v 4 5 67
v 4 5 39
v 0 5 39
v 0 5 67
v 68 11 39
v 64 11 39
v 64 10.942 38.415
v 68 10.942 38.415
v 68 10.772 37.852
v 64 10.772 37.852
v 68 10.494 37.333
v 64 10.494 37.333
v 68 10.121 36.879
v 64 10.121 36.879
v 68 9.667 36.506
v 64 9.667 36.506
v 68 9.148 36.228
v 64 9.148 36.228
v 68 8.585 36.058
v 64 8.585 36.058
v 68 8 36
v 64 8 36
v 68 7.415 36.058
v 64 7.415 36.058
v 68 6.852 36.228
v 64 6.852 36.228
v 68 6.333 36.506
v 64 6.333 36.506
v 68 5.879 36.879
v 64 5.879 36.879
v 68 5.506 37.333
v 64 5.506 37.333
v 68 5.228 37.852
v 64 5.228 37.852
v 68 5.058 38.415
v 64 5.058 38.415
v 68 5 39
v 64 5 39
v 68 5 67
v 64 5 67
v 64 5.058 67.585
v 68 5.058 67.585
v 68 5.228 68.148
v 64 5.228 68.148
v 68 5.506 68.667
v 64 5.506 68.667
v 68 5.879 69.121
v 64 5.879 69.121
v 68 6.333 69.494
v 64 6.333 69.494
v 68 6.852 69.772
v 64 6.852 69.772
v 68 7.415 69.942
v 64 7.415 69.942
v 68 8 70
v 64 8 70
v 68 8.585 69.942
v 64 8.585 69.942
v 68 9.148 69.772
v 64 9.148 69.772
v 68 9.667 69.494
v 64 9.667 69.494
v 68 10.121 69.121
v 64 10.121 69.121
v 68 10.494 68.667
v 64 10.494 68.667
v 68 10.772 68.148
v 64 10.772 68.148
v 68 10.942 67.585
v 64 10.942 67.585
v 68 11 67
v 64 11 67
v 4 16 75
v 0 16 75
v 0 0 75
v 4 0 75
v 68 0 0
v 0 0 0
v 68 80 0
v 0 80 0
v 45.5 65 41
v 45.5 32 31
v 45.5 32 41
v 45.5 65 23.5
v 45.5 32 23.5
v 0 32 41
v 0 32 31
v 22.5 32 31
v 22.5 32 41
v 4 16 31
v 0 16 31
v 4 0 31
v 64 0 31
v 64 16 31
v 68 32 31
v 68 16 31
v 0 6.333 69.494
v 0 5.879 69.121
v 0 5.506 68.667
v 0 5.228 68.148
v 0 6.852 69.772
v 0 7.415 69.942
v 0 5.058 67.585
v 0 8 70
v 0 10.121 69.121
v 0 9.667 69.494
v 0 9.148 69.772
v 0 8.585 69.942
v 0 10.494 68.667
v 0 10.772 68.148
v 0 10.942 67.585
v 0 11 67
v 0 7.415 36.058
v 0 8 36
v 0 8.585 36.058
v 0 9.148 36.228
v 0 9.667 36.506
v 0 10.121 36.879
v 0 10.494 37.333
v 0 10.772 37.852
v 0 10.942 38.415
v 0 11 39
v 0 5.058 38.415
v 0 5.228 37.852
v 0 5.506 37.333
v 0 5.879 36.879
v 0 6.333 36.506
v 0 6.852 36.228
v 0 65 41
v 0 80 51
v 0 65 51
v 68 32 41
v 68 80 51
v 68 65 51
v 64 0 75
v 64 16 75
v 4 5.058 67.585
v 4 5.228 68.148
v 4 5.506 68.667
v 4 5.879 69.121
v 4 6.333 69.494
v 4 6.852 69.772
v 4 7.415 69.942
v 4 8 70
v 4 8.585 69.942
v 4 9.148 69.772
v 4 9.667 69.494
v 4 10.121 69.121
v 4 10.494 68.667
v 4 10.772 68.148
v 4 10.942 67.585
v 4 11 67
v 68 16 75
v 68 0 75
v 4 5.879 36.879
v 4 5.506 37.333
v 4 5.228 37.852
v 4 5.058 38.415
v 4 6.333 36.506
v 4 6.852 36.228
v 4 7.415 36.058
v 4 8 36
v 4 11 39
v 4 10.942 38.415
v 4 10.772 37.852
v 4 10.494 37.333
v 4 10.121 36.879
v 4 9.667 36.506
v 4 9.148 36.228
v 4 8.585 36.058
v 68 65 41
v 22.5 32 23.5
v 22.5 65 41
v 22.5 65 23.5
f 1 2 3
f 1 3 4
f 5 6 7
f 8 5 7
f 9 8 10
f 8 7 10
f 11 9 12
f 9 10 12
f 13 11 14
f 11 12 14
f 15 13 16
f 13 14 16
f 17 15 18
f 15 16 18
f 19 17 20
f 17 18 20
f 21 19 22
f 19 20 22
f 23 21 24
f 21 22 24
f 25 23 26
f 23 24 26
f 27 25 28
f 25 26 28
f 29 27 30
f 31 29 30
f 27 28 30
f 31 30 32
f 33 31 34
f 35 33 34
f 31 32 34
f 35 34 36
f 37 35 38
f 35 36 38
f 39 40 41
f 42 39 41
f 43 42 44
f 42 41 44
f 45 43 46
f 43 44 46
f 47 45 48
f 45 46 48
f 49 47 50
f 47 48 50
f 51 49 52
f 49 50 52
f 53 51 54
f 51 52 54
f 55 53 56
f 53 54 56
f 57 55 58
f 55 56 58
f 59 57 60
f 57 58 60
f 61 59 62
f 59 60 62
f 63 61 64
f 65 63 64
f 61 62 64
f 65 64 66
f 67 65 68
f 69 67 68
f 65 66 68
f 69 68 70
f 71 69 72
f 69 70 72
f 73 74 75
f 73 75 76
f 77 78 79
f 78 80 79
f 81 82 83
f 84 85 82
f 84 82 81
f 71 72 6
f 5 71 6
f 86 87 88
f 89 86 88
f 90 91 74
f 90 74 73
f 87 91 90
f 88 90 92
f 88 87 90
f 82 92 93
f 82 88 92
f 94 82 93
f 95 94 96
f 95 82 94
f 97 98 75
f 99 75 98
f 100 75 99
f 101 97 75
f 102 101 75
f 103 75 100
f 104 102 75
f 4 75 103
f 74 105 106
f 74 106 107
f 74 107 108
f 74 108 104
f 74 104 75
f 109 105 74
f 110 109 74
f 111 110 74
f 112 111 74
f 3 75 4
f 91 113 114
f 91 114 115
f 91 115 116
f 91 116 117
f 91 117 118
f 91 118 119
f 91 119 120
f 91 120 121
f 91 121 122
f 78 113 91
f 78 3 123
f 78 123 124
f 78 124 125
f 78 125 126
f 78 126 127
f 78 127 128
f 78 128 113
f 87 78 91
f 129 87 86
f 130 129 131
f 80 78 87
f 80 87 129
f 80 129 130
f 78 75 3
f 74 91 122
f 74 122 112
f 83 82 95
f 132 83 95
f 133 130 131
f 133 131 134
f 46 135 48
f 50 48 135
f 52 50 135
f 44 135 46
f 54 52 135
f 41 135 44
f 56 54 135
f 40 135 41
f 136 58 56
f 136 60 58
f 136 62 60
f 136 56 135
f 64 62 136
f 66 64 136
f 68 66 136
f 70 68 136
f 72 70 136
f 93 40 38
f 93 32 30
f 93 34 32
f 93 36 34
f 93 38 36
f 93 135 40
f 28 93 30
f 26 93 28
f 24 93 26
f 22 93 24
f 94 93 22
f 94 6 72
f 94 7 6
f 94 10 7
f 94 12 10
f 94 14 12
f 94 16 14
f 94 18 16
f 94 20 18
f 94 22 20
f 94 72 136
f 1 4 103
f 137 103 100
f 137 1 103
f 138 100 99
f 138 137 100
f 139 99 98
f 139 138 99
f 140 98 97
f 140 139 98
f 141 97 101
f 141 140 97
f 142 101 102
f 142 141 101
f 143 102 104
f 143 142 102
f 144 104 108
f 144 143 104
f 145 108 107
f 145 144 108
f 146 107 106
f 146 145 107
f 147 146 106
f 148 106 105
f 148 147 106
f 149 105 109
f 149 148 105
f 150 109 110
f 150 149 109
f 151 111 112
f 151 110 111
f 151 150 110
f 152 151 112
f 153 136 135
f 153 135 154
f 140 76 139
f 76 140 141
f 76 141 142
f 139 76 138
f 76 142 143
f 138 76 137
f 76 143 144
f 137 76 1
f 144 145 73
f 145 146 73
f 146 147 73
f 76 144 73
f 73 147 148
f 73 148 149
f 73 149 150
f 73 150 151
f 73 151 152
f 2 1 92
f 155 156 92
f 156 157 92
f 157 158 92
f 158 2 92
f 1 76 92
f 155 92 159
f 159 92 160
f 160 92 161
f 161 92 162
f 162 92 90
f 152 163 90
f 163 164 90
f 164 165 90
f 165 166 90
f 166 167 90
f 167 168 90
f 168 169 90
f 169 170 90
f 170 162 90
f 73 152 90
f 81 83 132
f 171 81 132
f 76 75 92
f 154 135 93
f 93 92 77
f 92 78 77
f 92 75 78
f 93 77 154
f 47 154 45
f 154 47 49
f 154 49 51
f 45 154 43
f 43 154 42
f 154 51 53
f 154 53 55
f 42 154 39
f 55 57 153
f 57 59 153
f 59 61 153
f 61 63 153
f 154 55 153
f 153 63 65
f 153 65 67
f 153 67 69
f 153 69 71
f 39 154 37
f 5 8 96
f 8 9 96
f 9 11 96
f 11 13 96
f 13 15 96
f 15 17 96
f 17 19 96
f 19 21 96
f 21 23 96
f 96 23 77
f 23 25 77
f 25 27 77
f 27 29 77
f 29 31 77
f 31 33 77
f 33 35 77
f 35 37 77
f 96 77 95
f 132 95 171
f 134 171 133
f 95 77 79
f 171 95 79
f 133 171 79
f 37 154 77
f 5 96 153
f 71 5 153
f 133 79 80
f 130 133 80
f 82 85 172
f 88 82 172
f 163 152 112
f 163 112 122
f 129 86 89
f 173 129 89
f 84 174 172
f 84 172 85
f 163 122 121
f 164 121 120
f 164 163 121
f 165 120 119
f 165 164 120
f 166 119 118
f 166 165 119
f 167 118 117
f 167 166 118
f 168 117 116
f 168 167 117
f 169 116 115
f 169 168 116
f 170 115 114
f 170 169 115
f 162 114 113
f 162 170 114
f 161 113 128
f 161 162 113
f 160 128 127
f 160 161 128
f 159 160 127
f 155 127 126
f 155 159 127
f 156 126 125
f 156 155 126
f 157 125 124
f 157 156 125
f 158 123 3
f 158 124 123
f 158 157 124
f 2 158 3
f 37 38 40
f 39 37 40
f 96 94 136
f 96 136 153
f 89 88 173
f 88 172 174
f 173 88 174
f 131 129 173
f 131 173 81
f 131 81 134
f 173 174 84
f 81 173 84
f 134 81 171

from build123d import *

# Parameters (mm, degrees)
BOSS_EXTRUDE3_DEPTH     = 51
SKETCH2_5_W             = 23
SKETCH2_5_H             = 33
BOSS_EXTRUDE4_DEPTH     = 23.5
SKETCH2_6_W             = 22.5
SKETCH2_6_H             = 33
BOSS_EXTRUDE5_DEPTH     = 41
BOSS_EXTRUDE6_DEPTH     = 31
SKETCH2_8_W             = 4
SKETCH2_8_H             = 16
BOSS_EXTRUDE7_DEPTH     = 75
CUT_EXTRUDE1_DEPTH      = 65
CUT_EXTRUDE1_DEPTH_BACK = 5


with BuildPart() as part:
    # Sketch2 → Boss-Extrude3 (new body)
    with BuildSketch(Plane.XY):
        Polygon((0, 80), (0, 65), (22.5, 65), (45.5, 65), (68, 65), (68, 80), align=None)
    extrude(amount=BOSS_EXTRUDE3_DEPTH)

    # Sketch2_5 → Boss-Extrude4 (add)
    with BuildSketch(Plane.XY):
        with Locations((34, 48.5)):
            Rectangle(SKETCH2_5_W, SKETCH2_5_H)
    extrude(amount=BOSS_EXTRUDE4_DEPTH)

    # Sketch2_6 → Boss-Extrude5 (add)
    with BuildSketch(Plane.XY):
        with Locations((56.75, 48.5)):
            Rectangle(SKETCH2_6_W, SKETCH2_6_H)
        with Locations((11.25, 48.5)):
            Rectangle(SKETCH2_6_W, SKETCH2_6_H)
    extrude(amount=BOSS_EXTRUDE5_DEPTH)

    # Sketch2_7 → Boss-Extrude6 (add)
    with BuildSketch(Plane.XY):
        Polygon((22.5, 32), (0, 32), (0, 16), (4, 16), (4, 0), (64, 0), (64, 16), (68, 16), (68, 32), (45.5, 32), align=None)
    extrude(amount=BOSS_EXTRUDE6_DEPTH)

    # Sketch2_8 → Boss-Extrude7 (add)
    with BuildSketch(Plane.XY):
        with Locations((2, 8)):
            Rectangle(SKETCH2_8_W, SKETCH2_8_H)
        with Locations((66, 8)):
            Rectangle(SKETCH2_8_W, SKETCH2_8_H)
    extrude(amount=BOSS_EXTRUDE7_DEPTH)

    # Sketch9 → Cut-Extrude1 (cut, two sides)
    with BuildSketch(Plane(origin=(4, 0, 0), x_dir=(0, 0, -1), z_dir=(1, 0, 0))) as cut_extrude1_sk:
        with BuildLine():
            Line((-67, 11), (-39, 11))
            ThreePointArc((-39, 11), (-36, 8), (-39, 5))
            Line((-39, 5), (-67, 5))
            ThreePointArc((-67, 5), (-70, 8), (-67, 11))
        make_face()
    extrude(amount=CUT_EXTRUDE1_DEPTH, mode=Mode.SUBTRACT)
    extrude(cut_extrude1_sk.sketch, amount=-CUT_EXTRUDE1_DEPTH_BACK, mode=Mode.SUBTRACT)


solid = part.part
